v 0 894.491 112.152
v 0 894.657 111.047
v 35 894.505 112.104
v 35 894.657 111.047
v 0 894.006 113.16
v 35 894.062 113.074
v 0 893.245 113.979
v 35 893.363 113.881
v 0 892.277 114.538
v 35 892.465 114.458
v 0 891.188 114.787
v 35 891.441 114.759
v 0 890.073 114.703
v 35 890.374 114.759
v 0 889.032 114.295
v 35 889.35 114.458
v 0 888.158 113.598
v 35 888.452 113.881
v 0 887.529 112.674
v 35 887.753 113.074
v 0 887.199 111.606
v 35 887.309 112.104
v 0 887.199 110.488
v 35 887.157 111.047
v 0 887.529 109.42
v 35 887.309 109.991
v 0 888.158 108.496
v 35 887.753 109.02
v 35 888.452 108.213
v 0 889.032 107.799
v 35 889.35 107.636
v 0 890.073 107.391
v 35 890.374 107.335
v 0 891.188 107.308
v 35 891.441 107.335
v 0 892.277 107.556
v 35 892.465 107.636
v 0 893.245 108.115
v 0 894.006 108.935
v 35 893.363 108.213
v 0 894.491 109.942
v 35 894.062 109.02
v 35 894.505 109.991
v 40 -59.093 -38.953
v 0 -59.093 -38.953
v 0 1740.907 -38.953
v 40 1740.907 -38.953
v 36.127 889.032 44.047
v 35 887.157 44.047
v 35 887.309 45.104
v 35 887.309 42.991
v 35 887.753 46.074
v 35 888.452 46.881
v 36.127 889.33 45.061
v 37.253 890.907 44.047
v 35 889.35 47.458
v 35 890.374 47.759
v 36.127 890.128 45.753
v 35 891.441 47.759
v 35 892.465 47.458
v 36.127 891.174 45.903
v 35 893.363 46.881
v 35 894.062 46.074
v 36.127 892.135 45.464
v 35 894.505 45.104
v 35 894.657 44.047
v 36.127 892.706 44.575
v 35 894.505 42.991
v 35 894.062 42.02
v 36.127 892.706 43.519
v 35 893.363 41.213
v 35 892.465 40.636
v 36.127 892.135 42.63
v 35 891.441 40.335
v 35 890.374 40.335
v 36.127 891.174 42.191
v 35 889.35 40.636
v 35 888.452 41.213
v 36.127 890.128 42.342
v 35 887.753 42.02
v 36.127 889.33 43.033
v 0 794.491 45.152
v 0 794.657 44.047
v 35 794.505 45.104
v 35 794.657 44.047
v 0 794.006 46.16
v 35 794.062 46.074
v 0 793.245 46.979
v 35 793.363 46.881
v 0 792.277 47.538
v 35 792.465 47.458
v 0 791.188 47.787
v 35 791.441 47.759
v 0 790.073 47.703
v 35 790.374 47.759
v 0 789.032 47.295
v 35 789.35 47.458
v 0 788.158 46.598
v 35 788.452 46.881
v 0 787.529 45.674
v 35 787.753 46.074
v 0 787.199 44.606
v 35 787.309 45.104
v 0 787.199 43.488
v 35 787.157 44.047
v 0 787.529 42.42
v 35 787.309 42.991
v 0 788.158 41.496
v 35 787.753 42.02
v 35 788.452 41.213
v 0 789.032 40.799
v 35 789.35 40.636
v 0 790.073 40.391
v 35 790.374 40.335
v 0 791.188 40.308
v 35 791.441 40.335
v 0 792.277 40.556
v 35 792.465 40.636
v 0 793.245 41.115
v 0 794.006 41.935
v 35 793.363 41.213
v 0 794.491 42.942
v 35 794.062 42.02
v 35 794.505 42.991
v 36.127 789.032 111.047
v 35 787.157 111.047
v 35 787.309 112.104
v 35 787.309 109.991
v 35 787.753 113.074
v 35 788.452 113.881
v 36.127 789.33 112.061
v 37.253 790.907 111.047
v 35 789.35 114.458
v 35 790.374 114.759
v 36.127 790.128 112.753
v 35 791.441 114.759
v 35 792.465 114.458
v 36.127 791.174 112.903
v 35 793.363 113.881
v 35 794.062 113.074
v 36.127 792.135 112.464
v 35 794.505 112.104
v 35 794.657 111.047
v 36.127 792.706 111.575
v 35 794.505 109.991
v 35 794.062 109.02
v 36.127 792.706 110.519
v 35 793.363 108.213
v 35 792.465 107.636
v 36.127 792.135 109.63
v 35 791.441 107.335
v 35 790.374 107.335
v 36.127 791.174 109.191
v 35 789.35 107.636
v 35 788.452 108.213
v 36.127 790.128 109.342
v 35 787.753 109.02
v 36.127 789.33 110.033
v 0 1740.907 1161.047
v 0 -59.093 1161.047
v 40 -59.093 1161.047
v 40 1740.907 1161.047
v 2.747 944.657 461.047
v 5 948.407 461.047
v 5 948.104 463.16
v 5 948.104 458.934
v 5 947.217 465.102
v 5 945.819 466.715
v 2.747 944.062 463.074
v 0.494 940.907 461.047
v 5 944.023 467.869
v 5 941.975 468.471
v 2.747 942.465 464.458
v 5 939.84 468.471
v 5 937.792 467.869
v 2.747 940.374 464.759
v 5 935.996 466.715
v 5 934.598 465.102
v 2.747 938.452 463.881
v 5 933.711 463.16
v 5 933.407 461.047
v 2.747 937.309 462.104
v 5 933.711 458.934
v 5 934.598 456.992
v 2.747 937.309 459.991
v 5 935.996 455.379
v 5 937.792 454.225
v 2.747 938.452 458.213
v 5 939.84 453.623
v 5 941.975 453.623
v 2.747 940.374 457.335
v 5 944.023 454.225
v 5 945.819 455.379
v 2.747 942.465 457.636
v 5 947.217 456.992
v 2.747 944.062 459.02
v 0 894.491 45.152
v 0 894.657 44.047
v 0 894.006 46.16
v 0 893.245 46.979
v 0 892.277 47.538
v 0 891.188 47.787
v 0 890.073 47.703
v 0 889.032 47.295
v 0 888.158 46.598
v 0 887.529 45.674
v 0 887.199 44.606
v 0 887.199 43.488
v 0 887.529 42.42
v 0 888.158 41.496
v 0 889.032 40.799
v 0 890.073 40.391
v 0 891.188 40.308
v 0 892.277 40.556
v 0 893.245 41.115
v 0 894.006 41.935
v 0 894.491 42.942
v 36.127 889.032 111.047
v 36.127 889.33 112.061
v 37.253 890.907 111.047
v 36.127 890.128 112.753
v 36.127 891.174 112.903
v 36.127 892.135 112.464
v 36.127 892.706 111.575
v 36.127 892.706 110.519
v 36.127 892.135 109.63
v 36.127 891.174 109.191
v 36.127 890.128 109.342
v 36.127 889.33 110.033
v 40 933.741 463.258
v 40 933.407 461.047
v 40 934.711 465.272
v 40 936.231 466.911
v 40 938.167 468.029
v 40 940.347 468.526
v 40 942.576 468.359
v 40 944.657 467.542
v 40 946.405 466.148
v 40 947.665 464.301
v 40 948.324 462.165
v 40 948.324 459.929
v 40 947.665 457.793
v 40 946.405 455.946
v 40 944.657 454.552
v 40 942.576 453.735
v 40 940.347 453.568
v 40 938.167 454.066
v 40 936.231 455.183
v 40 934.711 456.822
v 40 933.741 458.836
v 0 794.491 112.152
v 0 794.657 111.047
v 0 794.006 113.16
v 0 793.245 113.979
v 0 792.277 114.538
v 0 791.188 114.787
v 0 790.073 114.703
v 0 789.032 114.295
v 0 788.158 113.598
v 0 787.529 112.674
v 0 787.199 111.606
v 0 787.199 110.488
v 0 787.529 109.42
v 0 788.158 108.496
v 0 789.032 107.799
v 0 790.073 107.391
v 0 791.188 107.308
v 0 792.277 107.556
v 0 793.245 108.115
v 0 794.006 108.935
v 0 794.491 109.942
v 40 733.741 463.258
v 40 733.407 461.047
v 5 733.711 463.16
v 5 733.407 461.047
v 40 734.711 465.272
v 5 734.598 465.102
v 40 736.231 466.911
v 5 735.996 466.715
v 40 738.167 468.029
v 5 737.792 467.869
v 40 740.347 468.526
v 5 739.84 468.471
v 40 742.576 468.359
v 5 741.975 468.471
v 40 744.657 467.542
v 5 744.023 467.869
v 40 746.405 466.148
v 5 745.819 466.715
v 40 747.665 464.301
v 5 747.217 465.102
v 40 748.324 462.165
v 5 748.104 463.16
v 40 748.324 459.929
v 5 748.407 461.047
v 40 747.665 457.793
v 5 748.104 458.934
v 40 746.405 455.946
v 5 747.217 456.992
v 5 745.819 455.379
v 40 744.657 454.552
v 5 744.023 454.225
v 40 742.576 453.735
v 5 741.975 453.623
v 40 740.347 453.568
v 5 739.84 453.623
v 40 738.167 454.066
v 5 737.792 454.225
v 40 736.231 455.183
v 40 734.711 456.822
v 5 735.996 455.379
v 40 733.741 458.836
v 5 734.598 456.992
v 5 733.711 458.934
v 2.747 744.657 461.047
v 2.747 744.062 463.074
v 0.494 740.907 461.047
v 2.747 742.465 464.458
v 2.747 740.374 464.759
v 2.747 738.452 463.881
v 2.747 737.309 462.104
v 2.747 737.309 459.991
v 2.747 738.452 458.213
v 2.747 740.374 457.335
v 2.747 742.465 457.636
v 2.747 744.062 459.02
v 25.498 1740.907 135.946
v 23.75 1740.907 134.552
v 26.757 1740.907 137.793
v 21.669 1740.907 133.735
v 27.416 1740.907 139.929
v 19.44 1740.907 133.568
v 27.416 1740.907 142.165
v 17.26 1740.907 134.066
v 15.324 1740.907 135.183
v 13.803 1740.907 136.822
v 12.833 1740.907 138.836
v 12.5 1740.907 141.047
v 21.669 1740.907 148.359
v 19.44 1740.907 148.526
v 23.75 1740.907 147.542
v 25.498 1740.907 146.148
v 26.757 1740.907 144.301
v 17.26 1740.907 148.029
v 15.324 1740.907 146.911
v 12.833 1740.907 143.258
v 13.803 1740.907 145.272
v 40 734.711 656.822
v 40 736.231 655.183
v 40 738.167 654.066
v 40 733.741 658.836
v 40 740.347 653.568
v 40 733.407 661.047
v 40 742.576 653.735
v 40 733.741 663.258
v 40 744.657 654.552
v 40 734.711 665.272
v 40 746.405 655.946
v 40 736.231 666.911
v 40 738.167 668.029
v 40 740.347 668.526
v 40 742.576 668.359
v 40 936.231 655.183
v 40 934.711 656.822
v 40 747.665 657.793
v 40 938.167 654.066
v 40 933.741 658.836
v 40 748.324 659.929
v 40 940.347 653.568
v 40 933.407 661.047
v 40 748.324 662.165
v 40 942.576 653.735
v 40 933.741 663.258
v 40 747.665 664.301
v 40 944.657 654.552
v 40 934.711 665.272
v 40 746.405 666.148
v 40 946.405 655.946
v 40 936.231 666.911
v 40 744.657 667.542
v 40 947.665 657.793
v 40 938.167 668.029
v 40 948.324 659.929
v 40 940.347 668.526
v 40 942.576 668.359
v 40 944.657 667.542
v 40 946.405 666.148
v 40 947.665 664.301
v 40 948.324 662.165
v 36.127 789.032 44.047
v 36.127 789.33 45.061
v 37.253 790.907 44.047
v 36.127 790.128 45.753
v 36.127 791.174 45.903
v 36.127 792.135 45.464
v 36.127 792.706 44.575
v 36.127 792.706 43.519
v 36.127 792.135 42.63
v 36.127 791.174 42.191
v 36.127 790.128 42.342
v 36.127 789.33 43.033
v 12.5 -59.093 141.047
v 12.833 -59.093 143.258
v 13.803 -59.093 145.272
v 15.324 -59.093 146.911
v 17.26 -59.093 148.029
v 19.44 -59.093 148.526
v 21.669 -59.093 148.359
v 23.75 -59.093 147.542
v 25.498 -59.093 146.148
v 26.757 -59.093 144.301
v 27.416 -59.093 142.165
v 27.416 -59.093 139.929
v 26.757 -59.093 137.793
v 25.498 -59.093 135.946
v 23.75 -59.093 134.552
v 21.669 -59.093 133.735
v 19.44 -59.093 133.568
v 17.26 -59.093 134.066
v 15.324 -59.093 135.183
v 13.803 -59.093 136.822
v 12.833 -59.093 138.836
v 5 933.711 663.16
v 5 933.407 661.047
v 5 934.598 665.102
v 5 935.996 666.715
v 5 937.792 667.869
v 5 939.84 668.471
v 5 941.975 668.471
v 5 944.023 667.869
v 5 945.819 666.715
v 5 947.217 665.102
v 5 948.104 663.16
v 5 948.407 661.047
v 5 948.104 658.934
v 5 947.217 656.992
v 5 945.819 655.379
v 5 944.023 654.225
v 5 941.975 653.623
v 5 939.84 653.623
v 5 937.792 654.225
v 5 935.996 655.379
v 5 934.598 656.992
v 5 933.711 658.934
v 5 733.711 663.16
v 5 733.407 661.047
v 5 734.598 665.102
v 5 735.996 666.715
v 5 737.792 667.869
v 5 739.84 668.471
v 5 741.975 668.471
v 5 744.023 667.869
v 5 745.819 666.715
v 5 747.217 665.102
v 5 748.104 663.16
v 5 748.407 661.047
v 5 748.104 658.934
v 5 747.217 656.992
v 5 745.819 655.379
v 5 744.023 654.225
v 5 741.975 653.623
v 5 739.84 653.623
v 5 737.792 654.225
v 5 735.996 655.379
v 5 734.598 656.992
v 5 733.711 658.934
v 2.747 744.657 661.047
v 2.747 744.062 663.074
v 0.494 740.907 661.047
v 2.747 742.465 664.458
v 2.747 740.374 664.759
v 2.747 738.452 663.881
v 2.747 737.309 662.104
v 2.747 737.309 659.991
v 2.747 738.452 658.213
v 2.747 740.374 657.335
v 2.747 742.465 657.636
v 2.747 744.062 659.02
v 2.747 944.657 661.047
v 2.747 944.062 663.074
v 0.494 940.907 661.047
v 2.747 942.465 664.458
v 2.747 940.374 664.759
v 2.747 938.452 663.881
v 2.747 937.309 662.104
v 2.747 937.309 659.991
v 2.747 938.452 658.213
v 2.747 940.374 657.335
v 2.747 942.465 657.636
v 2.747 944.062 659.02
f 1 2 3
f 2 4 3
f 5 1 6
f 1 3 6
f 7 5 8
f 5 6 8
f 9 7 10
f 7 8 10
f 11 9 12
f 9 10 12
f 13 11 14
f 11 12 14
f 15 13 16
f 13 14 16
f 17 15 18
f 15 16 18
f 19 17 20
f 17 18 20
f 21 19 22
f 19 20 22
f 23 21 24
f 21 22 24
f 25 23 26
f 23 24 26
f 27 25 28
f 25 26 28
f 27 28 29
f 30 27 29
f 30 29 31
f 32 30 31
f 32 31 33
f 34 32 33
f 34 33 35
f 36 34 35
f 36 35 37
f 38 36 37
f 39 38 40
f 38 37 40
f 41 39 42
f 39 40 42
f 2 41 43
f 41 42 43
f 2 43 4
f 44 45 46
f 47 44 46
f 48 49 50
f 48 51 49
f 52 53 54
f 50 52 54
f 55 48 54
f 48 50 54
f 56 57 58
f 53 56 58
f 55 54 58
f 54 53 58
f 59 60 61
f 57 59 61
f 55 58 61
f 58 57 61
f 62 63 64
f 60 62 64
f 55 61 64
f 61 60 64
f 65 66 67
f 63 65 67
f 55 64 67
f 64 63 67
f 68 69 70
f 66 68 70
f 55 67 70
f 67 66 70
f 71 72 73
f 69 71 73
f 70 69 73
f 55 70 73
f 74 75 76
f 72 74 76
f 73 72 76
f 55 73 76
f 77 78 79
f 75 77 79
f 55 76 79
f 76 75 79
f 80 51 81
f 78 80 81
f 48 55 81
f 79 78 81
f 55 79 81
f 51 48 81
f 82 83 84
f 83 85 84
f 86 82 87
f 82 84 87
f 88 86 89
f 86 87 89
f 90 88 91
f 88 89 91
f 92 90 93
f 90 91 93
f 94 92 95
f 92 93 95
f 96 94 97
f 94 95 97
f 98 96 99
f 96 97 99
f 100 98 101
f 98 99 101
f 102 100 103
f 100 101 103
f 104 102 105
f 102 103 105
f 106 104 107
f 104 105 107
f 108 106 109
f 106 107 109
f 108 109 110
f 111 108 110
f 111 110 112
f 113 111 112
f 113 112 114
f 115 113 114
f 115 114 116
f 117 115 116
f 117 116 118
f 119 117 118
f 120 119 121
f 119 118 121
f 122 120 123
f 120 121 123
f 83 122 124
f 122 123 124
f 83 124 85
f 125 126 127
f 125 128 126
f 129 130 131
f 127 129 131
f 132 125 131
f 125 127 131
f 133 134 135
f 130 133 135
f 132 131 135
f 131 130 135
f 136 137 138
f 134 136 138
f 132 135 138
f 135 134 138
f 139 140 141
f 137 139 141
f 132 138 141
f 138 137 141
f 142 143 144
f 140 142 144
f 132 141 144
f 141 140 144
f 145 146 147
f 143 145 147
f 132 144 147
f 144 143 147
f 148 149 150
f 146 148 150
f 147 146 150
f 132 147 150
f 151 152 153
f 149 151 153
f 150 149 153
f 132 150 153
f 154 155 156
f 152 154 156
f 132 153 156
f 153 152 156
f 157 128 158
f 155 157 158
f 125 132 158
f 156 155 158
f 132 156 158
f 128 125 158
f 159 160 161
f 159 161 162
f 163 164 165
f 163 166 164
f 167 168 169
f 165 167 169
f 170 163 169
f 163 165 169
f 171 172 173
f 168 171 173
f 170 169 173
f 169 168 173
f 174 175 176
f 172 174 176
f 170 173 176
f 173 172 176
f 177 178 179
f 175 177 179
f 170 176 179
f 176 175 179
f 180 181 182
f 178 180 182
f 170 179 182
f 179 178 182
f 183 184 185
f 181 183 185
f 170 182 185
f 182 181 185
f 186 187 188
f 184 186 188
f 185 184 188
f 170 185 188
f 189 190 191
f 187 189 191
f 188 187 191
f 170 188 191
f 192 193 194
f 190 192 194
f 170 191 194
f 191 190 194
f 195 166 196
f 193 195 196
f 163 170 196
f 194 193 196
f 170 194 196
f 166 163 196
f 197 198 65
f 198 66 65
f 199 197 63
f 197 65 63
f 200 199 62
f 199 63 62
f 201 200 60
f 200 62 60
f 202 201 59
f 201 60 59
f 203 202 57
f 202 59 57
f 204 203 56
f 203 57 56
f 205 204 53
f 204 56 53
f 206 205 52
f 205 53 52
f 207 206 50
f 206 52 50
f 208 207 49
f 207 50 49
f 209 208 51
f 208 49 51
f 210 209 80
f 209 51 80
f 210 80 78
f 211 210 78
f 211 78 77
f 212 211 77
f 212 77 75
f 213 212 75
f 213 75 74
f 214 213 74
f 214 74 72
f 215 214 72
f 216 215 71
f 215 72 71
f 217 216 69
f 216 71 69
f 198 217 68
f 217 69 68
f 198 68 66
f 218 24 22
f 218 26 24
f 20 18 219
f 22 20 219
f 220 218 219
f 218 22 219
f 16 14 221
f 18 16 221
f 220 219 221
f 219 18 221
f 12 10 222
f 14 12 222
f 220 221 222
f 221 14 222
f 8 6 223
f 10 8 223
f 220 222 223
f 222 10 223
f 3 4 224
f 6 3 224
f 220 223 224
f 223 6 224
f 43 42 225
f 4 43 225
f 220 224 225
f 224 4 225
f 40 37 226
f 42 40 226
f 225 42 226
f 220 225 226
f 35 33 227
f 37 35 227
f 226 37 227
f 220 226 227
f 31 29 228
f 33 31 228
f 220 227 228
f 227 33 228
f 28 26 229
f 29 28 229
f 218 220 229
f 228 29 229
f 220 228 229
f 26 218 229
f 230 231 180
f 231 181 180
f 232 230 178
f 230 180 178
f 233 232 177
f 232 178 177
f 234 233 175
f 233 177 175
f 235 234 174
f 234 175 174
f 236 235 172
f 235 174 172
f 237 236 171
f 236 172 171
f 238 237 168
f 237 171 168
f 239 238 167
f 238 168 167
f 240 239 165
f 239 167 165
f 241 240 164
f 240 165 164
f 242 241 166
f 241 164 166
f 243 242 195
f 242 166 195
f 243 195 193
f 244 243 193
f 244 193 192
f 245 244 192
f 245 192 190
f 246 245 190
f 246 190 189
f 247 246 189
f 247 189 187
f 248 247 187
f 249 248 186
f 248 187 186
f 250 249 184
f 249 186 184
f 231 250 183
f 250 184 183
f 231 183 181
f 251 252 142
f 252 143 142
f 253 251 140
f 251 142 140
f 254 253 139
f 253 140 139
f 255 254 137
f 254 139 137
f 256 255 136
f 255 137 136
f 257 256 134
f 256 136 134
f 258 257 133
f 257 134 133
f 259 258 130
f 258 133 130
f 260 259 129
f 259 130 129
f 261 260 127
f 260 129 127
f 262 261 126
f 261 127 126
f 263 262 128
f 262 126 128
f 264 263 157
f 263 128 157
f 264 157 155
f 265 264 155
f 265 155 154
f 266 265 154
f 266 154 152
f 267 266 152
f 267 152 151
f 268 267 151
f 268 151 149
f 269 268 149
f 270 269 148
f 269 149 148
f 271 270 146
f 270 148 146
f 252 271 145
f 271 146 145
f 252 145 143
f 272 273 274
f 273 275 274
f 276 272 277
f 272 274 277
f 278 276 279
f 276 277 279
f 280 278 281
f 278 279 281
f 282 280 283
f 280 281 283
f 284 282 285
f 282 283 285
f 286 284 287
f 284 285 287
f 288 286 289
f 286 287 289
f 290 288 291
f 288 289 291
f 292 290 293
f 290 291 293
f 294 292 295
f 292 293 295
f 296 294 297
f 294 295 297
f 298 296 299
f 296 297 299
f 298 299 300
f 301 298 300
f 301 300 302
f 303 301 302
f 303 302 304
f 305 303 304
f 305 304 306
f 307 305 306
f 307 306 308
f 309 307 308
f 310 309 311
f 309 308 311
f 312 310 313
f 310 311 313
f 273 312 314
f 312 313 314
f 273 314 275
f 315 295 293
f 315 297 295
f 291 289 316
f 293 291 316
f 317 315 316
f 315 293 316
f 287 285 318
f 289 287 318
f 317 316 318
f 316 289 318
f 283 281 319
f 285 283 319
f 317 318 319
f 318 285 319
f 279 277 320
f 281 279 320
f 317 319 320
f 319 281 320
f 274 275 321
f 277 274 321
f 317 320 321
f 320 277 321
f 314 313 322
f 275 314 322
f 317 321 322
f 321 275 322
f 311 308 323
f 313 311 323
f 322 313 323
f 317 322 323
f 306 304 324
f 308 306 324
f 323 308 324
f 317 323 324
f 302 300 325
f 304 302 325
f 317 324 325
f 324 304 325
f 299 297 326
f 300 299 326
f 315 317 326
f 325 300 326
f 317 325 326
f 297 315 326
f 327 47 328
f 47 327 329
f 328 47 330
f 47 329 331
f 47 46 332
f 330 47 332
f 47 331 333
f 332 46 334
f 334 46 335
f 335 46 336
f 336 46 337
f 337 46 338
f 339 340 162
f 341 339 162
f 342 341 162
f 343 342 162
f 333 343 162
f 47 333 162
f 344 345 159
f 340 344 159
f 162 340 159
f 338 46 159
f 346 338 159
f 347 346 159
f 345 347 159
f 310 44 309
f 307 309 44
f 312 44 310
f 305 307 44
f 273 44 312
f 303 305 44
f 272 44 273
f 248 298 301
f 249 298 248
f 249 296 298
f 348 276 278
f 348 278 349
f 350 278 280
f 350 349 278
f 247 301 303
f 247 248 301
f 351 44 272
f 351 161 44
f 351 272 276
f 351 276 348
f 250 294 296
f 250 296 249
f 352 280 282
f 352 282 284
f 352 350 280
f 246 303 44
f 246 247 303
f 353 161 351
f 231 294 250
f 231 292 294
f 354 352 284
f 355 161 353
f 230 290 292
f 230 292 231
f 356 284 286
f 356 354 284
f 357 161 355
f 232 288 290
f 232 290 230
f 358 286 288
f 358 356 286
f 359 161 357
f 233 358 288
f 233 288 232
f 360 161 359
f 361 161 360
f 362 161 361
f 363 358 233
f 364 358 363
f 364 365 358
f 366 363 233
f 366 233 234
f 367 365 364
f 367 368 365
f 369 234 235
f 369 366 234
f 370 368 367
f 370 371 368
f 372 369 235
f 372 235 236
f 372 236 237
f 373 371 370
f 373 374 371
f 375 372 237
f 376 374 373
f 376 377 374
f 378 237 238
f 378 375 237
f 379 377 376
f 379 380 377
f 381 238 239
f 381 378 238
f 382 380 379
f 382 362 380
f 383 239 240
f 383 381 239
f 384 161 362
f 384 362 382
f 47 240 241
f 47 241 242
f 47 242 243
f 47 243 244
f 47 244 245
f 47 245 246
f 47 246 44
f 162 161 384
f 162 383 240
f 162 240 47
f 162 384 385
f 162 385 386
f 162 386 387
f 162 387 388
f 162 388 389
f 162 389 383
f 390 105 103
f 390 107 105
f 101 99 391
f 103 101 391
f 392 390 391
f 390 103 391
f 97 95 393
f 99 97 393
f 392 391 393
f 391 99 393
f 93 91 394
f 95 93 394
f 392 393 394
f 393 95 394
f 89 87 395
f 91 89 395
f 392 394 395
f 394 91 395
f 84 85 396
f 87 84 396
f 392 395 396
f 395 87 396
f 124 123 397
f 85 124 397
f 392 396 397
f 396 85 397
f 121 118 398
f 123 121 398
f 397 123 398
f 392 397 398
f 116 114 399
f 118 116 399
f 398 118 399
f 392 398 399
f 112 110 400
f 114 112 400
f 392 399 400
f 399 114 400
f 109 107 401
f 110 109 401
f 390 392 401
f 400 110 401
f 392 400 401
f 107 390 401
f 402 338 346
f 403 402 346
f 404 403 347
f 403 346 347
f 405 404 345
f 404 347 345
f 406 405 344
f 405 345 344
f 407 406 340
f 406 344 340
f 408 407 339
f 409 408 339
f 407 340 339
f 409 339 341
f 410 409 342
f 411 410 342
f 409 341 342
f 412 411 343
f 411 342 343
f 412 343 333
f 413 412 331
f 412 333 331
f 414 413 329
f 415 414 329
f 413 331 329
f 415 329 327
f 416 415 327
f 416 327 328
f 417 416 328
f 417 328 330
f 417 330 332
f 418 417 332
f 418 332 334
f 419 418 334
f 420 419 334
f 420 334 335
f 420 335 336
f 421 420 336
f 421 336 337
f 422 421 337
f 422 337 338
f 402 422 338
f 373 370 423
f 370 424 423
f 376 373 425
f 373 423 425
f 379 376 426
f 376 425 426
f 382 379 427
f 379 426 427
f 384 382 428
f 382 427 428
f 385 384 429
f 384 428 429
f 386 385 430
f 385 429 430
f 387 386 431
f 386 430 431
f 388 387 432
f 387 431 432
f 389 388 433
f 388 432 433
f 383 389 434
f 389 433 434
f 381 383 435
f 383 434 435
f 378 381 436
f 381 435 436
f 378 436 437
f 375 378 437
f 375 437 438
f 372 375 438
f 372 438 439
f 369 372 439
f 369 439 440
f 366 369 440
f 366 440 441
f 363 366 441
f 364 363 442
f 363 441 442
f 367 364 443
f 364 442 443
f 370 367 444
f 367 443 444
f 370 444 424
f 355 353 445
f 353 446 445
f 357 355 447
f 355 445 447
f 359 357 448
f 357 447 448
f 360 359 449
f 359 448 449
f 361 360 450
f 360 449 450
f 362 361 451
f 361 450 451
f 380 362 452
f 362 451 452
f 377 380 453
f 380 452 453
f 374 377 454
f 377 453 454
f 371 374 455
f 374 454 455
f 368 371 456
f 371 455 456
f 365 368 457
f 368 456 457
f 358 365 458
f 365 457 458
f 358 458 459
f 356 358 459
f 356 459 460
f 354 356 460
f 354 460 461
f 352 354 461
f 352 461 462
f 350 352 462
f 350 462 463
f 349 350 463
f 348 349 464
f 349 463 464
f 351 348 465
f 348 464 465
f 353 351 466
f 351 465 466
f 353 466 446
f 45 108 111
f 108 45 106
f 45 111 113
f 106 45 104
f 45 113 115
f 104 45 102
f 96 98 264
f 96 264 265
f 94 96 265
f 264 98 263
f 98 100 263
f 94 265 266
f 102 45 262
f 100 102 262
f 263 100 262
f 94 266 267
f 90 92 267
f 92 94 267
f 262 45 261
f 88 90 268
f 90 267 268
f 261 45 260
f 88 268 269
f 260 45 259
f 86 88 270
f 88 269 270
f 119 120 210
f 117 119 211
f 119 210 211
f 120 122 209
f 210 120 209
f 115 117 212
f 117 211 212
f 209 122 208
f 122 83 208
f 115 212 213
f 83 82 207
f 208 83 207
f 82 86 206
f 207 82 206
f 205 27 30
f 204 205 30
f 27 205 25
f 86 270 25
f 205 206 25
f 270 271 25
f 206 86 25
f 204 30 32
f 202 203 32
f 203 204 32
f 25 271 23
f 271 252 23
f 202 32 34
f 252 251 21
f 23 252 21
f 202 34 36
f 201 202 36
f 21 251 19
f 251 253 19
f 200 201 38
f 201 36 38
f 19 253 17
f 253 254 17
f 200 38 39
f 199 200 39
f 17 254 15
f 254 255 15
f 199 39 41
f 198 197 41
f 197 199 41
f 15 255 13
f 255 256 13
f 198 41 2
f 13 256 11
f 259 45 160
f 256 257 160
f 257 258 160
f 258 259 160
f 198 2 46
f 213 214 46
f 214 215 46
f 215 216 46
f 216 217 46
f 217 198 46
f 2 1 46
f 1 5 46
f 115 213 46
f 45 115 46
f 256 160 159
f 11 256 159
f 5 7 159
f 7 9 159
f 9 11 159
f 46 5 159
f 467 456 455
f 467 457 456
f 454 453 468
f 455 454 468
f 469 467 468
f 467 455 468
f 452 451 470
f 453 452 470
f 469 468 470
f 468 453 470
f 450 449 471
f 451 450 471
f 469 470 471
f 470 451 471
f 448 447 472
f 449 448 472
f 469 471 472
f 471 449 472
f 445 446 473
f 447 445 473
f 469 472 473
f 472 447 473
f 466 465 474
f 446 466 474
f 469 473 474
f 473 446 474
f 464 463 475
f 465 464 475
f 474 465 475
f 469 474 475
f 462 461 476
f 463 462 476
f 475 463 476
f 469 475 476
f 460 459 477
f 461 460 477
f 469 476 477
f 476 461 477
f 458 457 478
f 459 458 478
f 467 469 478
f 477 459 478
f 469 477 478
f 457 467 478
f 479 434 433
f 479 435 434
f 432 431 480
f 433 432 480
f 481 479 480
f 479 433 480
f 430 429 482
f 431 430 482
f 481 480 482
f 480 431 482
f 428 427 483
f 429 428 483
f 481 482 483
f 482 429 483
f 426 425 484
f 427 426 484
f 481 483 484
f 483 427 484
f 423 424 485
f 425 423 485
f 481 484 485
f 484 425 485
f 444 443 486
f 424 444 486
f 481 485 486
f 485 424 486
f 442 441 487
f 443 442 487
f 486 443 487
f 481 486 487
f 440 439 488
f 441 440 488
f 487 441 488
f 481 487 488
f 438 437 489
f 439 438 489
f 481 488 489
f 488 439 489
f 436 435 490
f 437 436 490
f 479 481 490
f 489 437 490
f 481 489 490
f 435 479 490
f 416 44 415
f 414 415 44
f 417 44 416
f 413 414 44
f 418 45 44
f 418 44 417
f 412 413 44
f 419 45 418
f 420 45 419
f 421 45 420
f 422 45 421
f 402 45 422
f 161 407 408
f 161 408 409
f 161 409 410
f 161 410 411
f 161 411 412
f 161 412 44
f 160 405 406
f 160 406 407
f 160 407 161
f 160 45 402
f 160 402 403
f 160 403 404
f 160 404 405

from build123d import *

# Parameters (mm, degrees)
F0_W     = 1800
F0_H     = 1200
F1_DEPTH = 40
F3_D     = 15
F5_D     = 7.5
F5_DEPTH = 35
F5_TIP   = 2.2532273214
F7_D     = 15
F7_DEPTH = 35
F7_TIP   = 4.5064546427


with BuildPart() as f1:
    # F0 (on Right) → F1 (new body)
    with BuildSketch(Plane.YZ):
        with Locations((840.9073479474, 561.04709059)):
            Rectangle(F0_W, F0_H)
    extrude(amount=F1_DEPTH)

    # F3 (through all)
    with Locations(Plane.XZ.offset(59.0926520526)):
        with Locations((20, 141.04709059)):
            Hole(F3_D / 2)

    # F5
    with Locations(Plane(origin=(0, 0, 0), x_dir=(0, -1, 0), z_dir=(-1, 0, 0))):
        with Locations((-890.9073479474, 111.04709059), (-890.9073479474, 44.04709059), (-790.9073479474, 44.04709059), (-790.9073479474, 111.04709059)):
            Hole(F5_D / 2, depth=F5_DEPTH)
            with Locations((0, 0, -(F5_DEPTH + F5_TIP / 2))):  # 118° drill point
                Cone(0, F5_D / 2, F5_TIP, mode=Mode.SUBTRACT)

    # F7
    with Locations(Plane.YZ.offset(40)):
        with Locations((740.9073479474, 661.04709059), (940.9073479474, 661.04709059), (940.9073479474, 461.04709059), (740.9073479474, 461.04709059)):
            Hole(F7_D / 2, depth=F7_DEPTH)
            with Locations((0, 0, -(F7_DEPTH + F7_TIP / 2))):  # 118° drill point
                Cone(0, F7_D / 2, F7_TIP, mode=Mode.SUBTRACT)


solid = f1.part
